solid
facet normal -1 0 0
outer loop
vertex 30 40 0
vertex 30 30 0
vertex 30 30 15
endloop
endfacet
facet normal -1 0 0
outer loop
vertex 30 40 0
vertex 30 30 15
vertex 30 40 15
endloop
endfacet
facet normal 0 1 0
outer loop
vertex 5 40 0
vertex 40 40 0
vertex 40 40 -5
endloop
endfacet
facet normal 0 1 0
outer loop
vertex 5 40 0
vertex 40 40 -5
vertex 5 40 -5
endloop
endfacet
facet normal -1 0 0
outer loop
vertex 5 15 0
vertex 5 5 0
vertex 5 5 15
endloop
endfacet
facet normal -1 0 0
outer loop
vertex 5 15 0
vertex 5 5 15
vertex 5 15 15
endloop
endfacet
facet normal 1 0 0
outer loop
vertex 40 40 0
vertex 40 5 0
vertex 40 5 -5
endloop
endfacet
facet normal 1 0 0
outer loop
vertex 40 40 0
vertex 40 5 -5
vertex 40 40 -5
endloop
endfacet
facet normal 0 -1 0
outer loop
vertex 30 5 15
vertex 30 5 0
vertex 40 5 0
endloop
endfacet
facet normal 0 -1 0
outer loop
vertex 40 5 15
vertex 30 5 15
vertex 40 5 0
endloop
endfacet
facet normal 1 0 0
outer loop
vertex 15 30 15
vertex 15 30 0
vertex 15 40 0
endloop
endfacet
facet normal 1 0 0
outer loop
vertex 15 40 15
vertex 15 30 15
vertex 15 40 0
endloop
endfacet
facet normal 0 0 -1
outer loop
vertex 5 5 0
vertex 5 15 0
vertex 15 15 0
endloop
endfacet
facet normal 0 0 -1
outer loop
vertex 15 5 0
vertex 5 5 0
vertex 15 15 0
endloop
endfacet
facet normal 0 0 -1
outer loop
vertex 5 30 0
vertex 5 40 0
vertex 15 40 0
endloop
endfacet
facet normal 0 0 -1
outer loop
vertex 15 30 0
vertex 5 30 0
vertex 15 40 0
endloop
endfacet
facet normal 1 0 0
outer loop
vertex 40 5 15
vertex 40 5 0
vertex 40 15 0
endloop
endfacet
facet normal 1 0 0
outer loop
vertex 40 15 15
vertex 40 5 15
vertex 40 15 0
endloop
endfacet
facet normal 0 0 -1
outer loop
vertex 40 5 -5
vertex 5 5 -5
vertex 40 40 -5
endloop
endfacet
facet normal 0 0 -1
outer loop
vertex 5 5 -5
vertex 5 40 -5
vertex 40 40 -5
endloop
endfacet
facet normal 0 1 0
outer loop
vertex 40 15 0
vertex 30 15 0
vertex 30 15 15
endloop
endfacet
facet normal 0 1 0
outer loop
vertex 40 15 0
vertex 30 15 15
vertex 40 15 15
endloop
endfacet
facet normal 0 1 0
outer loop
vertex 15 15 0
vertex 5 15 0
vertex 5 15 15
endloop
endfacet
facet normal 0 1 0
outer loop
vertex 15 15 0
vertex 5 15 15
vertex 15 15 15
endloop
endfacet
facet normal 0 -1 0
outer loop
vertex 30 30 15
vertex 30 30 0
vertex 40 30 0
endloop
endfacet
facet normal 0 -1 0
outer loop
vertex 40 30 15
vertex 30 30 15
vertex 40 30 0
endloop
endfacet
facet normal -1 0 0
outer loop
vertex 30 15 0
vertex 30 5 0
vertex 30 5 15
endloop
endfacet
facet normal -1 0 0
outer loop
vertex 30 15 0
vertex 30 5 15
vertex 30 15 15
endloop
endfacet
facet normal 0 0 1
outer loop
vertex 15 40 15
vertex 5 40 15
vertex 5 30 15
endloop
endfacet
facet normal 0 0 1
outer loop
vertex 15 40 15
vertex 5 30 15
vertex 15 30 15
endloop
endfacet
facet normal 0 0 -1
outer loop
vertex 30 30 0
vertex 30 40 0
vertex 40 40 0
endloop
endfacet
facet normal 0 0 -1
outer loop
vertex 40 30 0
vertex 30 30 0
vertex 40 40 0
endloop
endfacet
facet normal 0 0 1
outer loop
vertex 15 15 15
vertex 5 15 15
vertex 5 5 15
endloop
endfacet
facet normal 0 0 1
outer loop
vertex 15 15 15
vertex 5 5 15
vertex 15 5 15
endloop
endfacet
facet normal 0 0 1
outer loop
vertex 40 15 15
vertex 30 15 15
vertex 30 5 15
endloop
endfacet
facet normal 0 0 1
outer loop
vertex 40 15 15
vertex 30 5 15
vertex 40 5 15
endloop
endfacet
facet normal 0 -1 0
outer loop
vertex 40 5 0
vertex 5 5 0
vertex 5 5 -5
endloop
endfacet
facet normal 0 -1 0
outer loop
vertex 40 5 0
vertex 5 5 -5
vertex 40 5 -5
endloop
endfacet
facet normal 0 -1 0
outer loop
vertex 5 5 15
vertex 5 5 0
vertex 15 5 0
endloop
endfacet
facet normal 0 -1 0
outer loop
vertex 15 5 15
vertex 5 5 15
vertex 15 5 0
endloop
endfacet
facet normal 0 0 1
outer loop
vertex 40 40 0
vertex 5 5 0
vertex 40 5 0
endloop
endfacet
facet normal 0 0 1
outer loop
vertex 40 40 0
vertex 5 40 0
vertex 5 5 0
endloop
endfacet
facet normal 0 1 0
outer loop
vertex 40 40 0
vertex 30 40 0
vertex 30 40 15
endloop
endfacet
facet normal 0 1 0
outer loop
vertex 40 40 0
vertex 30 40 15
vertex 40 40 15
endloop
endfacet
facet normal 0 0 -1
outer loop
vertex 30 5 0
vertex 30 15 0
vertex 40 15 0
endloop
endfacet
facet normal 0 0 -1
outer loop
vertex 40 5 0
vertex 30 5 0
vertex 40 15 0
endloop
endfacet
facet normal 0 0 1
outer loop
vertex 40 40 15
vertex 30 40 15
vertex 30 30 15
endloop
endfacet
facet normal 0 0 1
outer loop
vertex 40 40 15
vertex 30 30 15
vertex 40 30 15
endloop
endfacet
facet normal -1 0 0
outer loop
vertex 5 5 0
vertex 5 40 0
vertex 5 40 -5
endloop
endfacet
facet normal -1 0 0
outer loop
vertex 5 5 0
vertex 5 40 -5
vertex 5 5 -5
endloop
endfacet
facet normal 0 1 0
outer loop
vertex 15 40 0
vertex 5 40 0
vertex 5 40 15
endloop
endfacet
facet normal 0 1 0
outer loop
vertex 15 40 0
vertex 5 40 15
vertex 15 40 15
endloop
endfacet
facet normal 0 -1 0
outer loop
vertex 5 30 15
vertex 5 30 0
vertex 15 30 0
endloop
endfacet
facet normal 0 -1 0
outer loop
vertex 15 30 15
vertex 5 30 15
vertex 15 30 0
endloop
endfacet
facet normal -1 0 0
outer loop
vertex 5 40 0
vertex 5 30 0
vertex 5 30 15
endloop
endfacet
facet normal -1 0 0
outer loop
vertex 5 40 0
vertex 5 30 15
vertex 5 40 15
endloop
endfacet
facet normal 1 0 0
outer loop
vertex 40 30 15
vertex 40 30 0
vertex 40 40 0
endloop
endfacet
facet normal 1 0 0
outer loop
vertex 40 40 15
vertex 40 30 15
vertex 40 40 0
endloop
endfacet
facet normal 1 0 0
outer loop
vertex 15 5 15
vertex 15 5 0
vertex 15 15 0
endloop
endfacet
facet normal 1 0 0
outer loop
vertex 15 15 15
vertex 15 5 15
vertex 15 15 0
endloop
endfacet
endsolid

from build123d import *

# Parameters (mm, degrees)
F0_W     = 10
F0_H     = 10
F1_DEPTH = 15
F2_DEPTH = 5


with BuildPart() as f1:
    # F0 (on Top) → F1 (new body)
    with BuildSketch(Plane.XY):
        with Locations((35, 10)):
            Rectangle(F0_W, F0_H)
        with Locations((10, 10)):
            Rectangle(F0_W, F0_H)
        with Locations((10, 35)):
            Rectangle(F0_W, F0_H)
        with Locations((35, 35)):
            Rectangle(F0_W, F0_H)
    extrude(amount=F1_DEPTH)


with BuildPart() as f2:
    # F0 (on Top) → F2 (new body)
    with BuildSketch(Plane.XY):
        with Locations((10, 10)):
            Rectangle(F0_W, F0_H)
        Polygon((15, 15), (15, 5), (30, 5), (30, 15), (40, 15), (40, 30), (30, 30), (30, 40), (15, 40), (15, 30), (5, 30), (5, 15), align=None)
        with Locations((35, 10)):
            Rectangle(F0_W, F0_H)
        with Locations((10, 35)):
            Rectangle(F0_W, F0_H)
        with Locations((35, 35)):
            Rectangle(F0_W, F0_H)
    extrude(amount=-F2_DEPTH)


solid = Compound([f1.part, f2.part])
